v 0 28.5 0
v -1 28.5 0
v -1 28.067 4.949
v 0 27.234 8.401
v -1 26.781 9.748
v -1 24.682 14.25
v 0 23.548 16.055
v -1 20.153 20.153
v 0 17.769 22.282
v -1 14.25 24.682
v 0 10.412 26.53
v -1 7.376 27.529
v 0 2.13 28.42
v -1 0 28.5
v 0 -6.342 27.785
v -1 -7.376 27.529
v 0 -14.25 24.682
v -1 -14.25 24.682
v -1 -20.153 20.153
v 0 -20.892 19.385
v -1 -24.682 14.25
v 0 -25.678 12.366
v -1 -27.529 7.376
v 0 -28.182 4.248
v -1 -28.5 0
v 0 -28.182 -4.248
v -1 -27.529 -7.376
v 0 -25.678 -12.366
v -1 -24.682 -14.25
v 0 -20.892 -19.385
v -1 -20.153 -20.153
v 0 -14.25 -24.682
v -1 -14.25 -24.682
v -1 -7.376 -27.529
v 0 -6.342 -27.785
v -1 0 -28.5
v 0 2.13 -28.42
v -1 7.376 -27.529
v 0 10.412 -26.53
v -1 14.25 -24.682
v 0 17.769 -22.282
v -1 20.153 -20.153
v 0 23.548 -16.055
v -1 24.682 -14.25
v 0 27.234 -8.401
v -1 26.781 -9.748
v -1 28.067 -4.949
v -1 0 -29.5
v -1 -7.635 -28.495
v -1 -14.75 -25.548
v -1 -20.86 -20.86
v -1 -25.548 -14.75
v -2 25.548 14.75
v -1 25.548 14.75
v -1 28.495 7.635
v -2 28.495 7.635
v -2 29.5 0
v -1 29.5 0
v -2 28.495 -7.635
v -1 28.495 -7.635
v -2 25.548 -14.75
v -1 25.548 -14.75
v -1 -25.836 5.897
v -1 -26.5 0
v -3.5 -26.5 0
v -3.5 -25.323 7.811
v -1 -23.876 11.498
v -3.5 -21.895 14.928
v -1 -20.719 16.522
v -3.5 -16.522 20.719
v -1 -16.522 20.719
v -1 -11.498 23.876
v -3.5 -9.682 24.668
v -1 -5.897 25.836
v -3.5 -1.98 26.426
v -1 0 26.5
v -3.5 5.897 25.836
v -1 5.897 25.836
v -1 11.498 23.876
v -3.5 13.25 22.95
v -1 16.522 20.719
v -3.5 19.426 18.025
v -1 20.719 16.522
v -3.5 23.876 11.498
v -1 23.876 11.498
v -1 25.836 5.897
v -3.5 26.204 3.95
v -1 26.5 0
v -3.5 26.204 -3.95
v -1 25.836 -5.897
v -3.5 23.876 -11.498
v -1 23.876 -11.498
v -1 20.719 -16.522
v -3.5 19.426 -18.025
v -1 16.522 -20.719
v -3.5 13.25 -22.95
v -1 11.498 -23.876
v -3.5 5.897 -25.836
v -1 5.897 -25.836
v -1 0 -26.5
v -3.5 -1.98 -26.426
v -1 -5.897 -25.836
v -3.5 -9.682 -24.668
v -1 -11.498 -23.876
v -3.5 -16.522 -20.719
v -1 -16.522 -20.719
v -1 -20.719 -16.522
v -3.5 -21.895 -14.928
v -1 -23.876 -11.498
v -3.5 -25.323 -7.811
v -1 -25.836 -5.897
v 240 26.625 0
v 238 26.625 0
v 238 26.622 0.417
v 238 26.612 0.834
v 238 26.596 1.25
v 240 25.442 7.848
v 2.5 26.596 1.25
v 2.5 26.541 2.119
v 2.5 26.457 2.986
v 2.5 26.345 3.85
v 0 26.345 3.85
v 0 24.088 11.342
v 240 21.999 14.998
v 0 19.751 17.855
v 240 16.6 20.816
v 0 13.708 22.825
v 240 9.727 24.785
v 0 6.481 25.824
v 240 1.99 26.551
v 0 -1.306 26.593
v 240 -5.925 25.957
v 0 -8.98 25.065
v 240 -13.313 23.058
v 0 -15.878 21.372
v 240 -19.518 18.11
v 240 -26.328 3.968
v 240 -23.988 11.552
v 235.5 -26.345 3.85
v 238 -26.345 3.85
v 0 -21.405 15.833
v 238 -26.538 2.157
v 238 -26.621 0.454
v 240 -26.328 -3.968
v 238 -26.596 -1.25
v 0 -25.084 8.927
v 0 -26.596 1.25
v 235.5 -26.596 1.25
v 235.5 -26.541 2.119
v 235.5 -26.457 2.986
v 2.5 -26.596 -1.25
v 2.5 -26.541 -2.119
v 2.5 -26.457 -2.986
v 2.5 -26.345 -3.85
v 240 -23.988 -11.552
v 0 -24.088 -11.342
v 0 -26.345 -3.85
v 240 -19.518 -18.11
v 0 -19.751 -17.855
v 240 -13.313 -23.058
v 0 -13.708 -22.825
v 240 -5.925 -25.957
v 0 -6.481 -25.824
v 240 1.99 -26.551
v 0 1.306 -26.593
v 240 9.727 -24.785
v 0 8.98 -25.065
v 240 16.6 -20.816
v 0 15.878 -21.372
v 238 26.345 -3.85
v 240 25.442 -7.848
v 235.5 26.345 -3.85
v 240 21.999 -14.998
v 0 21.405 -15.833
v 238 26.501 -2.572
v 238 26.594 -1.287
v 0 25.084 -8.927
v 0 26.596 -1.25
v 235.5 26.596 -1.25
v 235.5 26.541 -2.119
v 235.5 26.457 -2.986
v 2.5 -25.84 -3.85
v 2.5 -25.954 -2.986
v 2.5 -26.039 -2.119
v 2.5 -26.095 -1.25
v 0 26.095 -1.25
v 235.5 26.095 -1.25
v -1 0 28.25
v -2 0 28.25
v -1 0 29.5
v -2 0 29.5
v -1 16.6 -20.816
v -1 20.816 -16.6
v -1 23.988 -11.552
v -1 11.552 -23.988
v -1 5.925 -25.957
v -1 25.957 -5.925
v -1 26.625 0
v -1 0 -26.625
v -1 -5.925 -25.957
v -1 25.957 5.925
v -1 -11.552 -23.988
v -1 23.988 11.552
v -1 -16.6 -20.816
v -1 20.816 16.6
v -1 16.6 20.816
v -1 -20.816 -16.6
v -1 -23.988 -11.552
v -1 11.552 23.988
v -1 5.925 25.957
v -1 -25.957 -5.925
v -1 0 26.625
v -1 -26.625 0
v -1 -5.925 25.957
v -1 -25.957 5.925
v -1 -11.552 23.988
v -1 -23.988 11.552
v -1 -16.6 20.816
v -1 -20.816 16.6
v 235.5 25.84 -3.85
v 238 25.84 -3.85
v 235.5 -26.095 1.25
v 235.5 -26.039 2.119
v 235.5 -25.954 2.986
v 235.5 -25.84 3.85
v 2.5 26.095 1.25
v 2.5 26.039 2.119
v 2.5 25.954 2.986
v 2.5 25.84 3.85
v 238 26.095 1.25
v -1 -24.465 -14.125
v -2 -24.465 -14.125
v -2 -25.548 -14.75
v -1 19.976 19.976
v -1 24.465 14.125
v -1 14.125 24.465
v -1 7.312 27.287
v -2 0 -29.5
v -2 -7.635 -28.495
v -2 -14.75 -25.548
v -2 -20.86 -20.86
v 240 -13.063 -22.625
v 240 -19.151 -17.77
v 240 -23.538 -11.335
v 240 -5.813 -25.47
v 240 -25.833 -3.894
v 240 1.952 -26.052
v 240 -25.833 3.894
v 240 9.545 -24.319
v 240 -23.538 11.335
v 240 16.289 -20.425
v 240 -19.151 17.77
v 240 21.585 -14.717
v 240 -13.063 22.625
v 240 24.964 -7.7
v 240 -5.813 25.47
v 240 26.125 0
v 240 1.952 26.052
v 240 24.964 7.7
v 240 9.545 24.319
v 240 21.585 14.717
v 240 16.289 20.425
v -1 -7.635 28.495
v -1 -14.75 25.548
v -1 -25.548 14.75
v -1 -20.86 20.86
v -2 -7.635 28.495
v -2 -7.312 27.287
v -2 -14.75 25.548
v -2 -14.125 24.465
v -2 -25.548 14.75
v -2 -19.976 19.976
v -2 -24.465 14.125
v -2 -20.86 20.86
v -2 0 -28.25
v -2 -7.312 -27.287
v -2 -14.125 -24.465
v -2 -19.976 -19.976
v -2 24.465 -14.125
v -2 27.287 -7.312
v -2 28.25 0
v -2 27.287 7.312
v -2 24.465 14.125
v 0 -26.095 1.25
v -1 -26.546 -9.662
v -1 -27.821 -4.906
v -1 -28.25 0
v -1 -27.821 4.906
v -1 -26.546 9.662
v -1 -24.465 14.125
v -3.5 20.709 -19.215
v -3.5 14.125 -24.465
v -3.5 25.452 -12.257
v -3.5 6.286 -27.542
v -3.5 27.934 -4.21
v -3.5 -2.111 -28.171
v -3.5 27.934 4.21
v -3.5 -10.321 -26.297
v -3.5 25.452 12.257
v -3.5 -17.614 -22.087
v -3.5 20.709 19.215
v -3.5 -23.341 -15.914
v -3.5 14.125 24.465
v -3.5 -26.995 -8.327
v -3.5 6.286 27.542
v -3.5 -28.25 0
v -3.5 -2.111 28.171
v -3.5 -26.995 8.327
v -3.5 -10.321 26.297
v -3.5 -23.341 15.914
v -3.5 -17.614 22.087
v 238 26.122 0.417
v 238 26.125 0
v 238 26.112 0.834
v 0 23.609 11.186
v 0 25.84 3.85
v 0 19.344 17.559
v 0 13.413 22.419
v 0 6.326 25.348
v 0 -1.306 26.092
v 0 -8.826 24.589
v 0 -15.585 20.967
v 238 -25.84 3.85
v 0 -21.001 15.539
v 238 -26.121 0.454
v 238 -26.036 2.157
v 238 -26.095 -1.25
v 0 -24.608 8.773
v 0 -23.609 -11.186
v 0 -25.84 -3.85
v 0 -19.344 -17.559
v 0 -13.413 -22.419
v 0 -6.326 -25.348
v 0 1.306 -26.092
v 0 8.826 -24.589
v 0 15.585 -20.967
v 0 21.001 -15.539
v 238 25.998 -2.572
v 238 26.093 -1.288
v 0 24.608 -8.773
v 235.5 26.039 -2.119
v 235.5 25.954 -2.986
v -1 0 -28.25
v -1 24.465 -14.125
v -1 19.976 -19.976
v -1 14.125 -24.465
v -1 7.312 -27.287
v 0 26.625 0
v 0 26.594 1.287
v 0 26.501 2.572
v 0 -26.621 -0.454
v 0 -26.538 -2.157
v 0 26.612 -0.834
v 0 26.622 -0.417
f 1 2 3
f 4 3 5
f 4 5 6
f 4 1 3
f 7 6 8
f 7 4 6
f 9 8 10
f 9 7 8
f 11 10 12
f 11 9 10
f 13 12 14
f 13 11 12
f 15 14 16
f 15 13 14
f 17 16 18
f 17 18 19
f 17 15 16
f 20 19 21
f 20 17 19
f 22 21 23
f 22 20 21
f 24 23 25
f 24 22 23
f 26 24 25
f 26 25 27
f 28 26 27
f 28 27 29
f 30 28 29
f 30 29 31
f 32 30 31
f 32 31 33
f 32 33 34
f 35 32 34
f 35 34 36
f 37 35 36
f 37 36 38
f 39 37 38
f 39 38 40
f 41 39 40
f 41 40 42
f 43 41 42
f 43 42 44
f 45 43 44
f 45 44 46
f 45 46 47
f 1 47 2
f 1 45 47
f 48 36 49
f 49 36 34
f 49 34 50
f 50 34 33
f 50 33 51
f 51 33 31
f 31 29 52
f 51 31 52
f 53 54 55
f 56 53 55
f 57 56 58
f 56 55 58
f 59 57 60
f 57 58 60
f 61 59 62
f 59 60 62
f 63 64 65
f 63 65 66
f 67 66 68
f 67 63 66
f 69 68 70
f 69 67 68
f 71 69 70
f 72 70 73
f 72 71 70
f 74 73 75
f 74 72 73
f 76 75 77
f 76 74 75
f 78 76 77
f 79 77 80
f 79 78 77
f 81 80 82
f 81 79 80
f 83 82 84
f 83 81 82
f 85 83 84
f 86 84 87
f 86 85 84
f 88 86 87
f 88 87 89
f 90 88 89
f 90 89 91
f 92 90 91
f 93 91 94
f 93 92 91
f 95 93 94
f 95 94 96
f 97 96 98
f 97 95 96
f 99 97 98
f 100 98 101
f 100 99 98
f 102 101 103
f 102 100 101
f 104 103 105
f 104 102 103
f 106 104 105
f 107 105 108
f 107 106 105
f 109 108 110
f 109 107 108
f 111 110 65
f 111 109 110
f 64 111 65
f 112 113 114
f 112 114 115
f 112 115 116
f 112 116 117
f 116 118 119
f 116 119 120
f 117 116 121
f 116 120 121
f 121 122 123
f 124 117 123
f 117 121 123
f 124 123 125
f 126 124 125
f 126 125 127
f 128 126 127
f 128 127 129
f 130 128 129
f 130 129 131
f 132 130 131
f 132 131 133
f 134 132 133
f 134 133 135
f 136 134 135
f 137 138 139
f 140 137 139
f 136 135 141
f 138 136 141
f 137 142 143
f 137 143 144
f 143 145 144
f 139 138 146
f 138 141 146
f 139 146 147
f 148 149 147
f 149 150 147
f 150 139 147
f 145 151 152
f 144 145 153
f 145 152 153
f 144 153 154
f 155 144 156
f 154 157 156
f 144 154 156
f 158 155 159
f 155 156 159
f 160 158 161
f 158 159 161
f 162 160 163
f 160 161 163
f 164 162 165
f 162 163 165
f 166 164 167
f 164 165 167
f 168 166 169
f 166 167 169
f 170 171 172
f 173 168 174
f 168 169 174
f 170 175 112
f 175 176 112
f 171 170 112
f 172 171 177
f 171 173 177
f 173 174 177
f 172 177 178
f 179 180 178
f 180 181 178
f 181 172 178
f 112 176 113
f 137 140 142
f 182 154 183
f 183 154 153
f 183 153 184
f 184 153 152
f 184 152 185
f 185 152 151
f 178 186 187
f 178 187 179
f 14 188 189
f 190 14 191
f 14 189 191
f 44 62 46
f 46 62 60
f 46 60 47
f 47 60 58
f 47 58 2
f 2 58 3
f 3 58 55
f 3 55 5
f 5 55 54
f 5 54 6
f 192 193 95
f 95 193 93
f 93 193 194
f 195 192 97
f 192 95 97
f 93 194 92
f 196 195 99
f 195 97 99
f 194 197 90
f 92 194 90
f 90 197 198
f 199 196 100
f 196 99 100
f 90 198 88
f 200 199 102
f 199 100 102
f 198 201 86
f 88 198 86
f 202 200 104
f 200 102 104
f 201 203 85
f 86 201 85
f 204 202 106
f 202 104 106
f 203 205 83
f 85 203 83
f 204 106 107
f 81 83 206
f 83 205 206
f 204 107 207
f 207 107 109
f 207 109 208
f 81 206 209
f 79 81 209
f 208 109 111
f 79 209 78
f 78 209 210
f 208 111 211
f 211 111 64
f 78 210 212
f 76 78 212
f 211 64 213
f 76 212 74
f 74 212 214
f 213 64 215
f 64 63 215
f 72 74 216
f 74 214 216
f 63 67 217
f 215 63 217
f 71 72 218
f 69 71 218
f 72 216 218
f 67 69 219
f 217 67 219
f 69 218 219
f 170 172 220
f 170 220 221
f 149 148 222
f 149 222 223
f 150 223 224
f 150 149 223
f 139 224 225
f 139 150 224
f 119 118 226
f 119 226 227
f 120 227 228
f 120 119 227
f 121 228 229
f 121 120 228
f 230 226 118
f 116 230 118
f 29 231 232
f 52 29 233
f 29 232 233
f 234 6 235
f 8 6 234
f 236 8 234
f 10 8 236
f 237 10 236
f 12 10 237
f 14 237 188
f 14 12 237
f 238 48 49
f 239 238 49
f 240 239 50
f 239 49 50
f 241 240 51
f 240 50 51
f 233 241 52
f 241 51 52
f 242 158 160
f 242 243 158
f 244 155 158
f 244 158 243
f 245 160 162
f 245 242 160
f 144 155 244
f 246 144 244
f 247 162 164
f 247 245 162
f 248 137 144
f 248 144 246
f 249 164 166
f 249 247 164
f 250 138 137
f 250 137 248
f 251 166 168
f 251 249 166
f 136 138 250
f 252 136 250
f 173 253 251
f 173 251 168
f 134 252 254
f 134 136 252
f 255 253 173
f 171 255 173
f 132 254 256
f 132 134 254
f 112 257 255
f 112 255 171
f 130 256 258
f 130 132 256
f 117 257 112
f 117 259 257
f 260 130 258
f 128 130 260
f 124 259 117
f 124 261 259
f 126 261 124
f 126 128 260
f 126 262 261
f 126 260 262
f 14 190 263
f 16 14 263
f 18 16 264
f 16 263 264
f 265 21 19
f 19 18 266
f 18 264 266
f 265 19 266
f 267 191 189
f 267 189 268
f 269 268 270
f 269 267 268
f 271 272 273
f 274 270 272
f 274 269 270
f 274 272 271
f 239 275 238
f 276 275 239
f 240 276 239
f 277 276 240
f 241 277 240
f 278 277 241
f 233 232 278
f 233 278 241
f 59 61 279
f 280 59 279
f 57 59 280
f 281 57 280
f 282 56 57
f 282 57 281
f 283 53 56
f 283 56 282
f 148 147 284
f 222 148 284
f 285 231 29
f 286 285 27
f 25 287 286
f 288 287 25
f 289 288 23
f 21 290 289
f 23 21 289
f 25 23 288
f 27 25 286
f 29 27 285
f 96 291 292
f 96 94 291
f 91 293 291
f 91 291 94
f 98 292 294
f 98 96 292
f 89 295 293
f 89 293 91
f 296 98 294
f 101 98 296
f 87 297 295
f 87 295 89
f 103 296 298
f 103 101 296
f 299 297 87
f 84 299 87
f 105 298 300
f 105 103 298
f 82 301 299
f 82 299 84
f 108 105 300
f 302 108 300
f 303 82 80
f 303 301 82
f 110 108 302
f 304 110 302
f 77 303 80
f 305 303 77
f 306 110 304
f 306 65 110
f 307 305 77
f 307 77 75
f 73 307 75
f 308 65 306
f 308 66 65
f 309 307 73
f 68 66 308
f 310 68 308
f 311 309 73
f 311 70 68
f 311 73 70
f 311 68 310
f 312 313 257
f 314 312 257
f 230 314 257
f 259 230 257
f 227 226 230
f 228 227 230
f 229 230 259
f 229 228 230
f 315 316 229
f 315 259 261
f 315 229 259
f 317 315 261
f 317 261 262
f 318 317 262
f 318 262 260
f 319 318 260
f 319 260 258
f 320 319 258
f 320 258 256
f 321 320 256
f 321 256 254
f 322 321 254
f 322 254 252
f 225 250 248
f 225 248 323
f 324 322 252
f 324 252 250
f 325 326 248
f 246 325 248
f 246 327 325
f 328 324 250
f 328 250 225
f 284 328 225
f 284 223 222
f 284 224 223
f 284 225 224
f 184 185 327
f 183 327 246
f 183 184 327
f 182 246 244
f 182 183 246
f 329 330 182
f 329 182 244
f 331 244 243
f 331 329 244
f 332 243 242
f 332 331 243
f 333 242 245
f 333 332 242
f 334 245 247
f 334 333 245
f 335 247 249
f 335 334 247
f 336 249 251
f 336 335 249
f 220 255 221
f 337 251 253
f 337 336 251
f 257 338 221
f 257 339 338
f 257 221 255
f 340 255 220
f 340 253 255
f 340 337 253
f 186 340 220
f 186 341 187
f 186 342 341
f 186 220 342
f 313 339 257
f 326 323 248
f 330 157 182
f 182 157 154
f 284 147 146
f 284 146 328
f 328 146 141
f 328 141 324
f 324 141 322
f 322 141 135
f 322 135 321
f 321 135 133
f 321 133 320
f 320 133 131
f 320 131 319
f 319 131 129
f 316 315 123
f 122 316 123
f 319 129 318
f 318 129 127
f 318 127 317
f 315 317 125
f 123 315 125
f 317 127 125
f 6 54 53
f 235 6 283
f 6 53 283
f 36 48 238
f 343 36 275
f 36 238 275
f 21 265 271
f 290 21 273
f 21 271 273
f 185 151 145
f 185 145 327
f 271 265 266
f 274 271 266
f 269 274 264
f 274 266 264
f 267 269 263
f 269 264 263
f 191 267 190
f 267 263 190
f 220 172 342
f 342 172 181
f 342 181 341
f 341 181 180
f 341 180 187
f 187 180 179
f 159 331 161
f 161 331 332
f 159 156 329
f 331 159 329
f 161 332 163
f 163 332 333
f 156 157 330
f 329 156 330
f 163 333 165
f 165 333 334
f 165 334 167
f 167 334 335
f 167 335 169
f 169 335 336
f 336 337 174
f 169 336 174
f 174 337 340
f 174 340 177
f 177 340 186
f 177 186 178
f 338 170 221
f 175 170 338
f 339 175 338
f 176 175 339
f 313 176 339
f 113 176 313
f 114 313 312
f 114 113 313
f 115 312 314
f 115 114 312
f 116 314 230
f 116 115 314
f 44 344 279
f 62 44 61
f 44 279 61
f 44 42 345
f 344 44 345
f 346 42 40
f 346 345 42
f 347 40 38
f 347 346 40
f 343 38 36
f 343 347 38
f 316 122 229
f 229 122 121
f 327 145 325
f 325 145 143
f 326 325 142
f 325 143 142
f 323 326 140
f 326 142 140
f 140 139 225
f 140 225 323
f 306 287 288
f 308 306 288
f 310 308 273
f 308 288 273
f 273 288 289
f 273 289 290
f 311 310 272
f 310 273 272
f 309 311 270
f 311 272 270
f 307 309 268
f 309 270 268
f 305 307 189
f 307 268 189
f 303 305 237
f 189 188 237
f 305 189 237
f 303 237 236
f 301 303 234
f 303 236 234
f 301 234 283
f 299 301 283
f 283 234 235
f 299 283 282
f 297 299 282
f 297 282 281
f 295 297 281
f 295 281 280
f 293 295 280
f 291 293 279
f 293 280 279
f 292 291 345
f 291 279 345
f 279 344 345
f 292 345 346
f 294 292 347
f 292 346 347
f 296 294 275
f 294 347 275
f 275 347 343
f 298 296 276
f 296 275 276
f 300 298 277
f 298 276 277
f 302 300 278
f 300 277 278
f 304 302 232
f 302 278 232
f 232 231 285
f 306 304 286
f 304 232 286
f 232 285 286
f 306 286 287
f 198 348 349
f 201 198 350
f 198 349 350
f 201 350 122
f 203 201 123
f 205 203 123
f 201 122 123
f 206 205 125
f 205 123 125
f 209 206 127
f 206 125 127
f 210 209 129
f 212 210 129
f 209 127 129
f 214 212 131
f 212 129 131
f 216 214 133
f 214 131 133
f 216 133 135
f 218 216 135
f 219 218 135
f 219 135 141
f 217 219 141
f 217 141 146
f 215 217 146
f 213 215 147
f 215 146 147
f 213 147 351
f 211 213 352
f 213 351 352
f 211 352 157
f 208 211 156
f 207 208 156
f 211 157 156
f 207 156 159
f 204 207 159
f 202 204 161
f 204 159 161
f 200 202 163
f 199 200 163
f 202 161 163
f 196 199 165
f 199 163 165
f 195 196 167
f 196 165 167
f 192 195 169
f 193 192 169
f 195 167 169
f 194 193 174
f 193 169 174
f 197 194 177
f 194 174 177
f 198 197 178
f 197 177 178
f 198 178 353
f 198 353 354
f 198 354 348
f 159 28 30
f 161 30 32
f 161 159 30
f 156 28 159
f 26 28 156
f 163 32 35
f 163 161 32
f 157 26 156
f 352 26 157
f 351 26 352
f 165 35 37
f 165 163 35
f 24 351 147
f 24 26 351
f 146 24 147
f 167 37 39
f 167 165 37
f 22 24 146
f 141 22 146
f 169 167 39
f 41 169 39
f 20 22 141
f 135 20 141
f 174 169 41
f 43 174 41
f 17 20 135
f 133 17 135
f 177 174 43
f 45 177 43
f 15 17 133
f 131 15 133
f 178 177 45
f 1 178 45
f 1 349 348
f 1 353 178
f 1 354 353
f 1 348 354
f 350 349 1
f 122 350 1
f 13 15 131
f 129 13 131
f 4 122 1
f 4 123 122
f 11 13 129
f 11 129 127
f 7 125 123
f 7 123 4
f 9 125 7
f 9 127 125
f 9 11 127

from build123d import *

# Parameters (mm, degrees)
F0_R      = 26.625
F0_R_2    = 26.125
F1_DEPTH  = 240
F2_W      = 0.7316432893
F2_H      = 1.25
F3_DEPTH  = 238
F4_W      = 0.6623510725
F4_H      = 2.5
F5_DEPTH  = 238
F0_R_3    = 28.5
F6_DEPTH  = 1
F8_W      = 2.5
F8_H      = 2.6
F9_DEPTH  = 2
F11_W     = 2.5
F11_H     = 2.6
F12_DEPTH = 2
F13_DEPTH = 2
F14_DEPTH = 2
F16_R     = 29.5
F16_R_2   = 26.5
F17_DEPTH = 1
F19_DEPTH = 1
F15_R     = 28.25
F15_R_2   = 26.5
F20_DEPTH = 2.5


with BuildPart() as f1:
    # F0 (on Right) → F1 (new body)
    with BuildSketch(Plane.YZ):
        Circle(F0_R)
        Circle(F0_R_2, mode=Mode.SUBTRACT)
    extrude(amount=F1_DEPTH)

    # F2 (on Right) → F3 (cut)
    with BuildSketch(Plane.YZ):
        with Locations((-26.2591783553, -0.625)):
            Rectangle(F2_W, F2_H)
        with Locations((-26.2591783553, 0.625)):
            Rectangle(F2_W, F2_H)
    extrude(amount=F3_DEPTH, mode=Mode.SUBTRACT)

    # F4 (on Right) → F5 (cut)
    with BuildSketch(Plane.YZ):
        with Locations((26.2938244637, 0)):
            Rectangle(F4_W, F4_H)
    extrude(amount=F5_DEPTH, mode=Mode.SUBTRACT)

    # F0 (on Right) → F6 (join)
    with BuildSketch(Plane.YZ):
        Circle(F0_R_3)
        Circle(F0_R, mode=Mode.SUBTRACT)
    extrude(amount=-F6_DEPTH)

    # F8 (on offset) → F9 (cut)
    with BuildSketch(Plane.XZ.offset(-26.625)):
        with Locations((236.75, -2.55)):
            Rectangle(F8_W, F8_H)
    extrude(amount=F9_DEPTH, mode=Mode.SUBTRACT)

    # F11 (on offset) → F12 (cut)
    with BuildSketch(Plane.XZ.offset(26.625)):
        with Locations((1.25, -2.55)):
            Rectangle(F11_W, F11_H)
    extrude(amount=-F12_DEPTH, mode=Mode.SUBTRACT)

    # F11 (on offset) → F13 (cut)
    with BuildSketch(Plane.XZ.offset(26.625)):
        with Locations((236.75, 2.55)):
            Rectangle(F11_W, F11_H)
    extrude(amount=-F13_DEPTH, mode=Mode.SUBTRACT)

    # F8 (on offset) → F14 (cut)
    with BuildSketch(Plane.XZ.offset(-26.625)):
        with Locations((1.25, 2.55)):
            Rectangle(F8_W, F8_H)
    extrude(amount=F14_DEPTH, mode=Mode.SUBTRACT)

    # F16 (on face) → F17 (join)
    with BuildSketch(Plane(origin=(-1, 0, 0), x_dir=(0, -1, 0), z_dir=(-1, 0, 0))):
        Circle(F16_R)
        Circle(F16_R_2, mode=Mode.SUBTRACT)
    extrude(amount=F17_DEPTH)

    # F18 (on face) → F19 (cut)
    with BuildSketch(Plane(origin=(-2, 0, 0), x_dir=(0, -1, 0), z_dir=(-1, 0, 0))):
        with BuildLine():
            Line((0, 26.5), (0, 29.5))
            ThreePointArc((0, 29.5), (-14.75, 25.5477494116), (-25.5477494116, 14.75))
            Line((-25.5477494116, 14.75), (-22.9496732003, 13.25))
            ThreePointArc((-22.9496732003, 13.25), (-13.25, 22.9496732003), (0, 26.5))
        make_face()
        with BuildLine():
            ThreePointArc((29.5, 0), (28.4948118755, 7.6351618305), (25.5477494116, 14.75))
            Line((25.5477494116, 14.75), (22.9496732003, 13.25))
            ThreePointArc((22.9496732003, 13.25), (25.5970343967, 6.8587046952), (26.5, 0))
            ThreePointArc((26.5, 0), (25.5970343967, -6.8587046952), (22.9496732003, -13.25))
            Line((22.9496732003, -13.25), (25.5477494116, -14.75))
            ThreePointArc((25.5477494116, -14.75), (28.4948118755, -7.6351618305), (29.5, 0))
        make_face()
        with BuildLine():
            ThreePointArc((-25.5477494116, -14.75), (-14.75, -25.5477494116), (0, -29.5))
            Line((0, -29.5), (0, -26.5))
            ThreePointArc((0, -26.5), (-13.25, -22.9496732003), (-22.9496732003, -13.25))
            Line((-22.9496732003, -13.25), (-25.5477494116, -14.75))
        make_face()
    extrude(amount=-F19_DEPTH, mode=Mode.SUBTRACT)

    # F15 (on face) → F20 (join)
    with BuildSketch(Plane(origin=(-1, 0, 0), x_dir=(0, -1, 0), z_dir=(-1, 0, 0))):
        Circle(F15_R)
        Circle(F15_R_2, mode=Mode.SUBTRACT)
    extrude(amount=F20_DEPTH)


solid = f1.part
